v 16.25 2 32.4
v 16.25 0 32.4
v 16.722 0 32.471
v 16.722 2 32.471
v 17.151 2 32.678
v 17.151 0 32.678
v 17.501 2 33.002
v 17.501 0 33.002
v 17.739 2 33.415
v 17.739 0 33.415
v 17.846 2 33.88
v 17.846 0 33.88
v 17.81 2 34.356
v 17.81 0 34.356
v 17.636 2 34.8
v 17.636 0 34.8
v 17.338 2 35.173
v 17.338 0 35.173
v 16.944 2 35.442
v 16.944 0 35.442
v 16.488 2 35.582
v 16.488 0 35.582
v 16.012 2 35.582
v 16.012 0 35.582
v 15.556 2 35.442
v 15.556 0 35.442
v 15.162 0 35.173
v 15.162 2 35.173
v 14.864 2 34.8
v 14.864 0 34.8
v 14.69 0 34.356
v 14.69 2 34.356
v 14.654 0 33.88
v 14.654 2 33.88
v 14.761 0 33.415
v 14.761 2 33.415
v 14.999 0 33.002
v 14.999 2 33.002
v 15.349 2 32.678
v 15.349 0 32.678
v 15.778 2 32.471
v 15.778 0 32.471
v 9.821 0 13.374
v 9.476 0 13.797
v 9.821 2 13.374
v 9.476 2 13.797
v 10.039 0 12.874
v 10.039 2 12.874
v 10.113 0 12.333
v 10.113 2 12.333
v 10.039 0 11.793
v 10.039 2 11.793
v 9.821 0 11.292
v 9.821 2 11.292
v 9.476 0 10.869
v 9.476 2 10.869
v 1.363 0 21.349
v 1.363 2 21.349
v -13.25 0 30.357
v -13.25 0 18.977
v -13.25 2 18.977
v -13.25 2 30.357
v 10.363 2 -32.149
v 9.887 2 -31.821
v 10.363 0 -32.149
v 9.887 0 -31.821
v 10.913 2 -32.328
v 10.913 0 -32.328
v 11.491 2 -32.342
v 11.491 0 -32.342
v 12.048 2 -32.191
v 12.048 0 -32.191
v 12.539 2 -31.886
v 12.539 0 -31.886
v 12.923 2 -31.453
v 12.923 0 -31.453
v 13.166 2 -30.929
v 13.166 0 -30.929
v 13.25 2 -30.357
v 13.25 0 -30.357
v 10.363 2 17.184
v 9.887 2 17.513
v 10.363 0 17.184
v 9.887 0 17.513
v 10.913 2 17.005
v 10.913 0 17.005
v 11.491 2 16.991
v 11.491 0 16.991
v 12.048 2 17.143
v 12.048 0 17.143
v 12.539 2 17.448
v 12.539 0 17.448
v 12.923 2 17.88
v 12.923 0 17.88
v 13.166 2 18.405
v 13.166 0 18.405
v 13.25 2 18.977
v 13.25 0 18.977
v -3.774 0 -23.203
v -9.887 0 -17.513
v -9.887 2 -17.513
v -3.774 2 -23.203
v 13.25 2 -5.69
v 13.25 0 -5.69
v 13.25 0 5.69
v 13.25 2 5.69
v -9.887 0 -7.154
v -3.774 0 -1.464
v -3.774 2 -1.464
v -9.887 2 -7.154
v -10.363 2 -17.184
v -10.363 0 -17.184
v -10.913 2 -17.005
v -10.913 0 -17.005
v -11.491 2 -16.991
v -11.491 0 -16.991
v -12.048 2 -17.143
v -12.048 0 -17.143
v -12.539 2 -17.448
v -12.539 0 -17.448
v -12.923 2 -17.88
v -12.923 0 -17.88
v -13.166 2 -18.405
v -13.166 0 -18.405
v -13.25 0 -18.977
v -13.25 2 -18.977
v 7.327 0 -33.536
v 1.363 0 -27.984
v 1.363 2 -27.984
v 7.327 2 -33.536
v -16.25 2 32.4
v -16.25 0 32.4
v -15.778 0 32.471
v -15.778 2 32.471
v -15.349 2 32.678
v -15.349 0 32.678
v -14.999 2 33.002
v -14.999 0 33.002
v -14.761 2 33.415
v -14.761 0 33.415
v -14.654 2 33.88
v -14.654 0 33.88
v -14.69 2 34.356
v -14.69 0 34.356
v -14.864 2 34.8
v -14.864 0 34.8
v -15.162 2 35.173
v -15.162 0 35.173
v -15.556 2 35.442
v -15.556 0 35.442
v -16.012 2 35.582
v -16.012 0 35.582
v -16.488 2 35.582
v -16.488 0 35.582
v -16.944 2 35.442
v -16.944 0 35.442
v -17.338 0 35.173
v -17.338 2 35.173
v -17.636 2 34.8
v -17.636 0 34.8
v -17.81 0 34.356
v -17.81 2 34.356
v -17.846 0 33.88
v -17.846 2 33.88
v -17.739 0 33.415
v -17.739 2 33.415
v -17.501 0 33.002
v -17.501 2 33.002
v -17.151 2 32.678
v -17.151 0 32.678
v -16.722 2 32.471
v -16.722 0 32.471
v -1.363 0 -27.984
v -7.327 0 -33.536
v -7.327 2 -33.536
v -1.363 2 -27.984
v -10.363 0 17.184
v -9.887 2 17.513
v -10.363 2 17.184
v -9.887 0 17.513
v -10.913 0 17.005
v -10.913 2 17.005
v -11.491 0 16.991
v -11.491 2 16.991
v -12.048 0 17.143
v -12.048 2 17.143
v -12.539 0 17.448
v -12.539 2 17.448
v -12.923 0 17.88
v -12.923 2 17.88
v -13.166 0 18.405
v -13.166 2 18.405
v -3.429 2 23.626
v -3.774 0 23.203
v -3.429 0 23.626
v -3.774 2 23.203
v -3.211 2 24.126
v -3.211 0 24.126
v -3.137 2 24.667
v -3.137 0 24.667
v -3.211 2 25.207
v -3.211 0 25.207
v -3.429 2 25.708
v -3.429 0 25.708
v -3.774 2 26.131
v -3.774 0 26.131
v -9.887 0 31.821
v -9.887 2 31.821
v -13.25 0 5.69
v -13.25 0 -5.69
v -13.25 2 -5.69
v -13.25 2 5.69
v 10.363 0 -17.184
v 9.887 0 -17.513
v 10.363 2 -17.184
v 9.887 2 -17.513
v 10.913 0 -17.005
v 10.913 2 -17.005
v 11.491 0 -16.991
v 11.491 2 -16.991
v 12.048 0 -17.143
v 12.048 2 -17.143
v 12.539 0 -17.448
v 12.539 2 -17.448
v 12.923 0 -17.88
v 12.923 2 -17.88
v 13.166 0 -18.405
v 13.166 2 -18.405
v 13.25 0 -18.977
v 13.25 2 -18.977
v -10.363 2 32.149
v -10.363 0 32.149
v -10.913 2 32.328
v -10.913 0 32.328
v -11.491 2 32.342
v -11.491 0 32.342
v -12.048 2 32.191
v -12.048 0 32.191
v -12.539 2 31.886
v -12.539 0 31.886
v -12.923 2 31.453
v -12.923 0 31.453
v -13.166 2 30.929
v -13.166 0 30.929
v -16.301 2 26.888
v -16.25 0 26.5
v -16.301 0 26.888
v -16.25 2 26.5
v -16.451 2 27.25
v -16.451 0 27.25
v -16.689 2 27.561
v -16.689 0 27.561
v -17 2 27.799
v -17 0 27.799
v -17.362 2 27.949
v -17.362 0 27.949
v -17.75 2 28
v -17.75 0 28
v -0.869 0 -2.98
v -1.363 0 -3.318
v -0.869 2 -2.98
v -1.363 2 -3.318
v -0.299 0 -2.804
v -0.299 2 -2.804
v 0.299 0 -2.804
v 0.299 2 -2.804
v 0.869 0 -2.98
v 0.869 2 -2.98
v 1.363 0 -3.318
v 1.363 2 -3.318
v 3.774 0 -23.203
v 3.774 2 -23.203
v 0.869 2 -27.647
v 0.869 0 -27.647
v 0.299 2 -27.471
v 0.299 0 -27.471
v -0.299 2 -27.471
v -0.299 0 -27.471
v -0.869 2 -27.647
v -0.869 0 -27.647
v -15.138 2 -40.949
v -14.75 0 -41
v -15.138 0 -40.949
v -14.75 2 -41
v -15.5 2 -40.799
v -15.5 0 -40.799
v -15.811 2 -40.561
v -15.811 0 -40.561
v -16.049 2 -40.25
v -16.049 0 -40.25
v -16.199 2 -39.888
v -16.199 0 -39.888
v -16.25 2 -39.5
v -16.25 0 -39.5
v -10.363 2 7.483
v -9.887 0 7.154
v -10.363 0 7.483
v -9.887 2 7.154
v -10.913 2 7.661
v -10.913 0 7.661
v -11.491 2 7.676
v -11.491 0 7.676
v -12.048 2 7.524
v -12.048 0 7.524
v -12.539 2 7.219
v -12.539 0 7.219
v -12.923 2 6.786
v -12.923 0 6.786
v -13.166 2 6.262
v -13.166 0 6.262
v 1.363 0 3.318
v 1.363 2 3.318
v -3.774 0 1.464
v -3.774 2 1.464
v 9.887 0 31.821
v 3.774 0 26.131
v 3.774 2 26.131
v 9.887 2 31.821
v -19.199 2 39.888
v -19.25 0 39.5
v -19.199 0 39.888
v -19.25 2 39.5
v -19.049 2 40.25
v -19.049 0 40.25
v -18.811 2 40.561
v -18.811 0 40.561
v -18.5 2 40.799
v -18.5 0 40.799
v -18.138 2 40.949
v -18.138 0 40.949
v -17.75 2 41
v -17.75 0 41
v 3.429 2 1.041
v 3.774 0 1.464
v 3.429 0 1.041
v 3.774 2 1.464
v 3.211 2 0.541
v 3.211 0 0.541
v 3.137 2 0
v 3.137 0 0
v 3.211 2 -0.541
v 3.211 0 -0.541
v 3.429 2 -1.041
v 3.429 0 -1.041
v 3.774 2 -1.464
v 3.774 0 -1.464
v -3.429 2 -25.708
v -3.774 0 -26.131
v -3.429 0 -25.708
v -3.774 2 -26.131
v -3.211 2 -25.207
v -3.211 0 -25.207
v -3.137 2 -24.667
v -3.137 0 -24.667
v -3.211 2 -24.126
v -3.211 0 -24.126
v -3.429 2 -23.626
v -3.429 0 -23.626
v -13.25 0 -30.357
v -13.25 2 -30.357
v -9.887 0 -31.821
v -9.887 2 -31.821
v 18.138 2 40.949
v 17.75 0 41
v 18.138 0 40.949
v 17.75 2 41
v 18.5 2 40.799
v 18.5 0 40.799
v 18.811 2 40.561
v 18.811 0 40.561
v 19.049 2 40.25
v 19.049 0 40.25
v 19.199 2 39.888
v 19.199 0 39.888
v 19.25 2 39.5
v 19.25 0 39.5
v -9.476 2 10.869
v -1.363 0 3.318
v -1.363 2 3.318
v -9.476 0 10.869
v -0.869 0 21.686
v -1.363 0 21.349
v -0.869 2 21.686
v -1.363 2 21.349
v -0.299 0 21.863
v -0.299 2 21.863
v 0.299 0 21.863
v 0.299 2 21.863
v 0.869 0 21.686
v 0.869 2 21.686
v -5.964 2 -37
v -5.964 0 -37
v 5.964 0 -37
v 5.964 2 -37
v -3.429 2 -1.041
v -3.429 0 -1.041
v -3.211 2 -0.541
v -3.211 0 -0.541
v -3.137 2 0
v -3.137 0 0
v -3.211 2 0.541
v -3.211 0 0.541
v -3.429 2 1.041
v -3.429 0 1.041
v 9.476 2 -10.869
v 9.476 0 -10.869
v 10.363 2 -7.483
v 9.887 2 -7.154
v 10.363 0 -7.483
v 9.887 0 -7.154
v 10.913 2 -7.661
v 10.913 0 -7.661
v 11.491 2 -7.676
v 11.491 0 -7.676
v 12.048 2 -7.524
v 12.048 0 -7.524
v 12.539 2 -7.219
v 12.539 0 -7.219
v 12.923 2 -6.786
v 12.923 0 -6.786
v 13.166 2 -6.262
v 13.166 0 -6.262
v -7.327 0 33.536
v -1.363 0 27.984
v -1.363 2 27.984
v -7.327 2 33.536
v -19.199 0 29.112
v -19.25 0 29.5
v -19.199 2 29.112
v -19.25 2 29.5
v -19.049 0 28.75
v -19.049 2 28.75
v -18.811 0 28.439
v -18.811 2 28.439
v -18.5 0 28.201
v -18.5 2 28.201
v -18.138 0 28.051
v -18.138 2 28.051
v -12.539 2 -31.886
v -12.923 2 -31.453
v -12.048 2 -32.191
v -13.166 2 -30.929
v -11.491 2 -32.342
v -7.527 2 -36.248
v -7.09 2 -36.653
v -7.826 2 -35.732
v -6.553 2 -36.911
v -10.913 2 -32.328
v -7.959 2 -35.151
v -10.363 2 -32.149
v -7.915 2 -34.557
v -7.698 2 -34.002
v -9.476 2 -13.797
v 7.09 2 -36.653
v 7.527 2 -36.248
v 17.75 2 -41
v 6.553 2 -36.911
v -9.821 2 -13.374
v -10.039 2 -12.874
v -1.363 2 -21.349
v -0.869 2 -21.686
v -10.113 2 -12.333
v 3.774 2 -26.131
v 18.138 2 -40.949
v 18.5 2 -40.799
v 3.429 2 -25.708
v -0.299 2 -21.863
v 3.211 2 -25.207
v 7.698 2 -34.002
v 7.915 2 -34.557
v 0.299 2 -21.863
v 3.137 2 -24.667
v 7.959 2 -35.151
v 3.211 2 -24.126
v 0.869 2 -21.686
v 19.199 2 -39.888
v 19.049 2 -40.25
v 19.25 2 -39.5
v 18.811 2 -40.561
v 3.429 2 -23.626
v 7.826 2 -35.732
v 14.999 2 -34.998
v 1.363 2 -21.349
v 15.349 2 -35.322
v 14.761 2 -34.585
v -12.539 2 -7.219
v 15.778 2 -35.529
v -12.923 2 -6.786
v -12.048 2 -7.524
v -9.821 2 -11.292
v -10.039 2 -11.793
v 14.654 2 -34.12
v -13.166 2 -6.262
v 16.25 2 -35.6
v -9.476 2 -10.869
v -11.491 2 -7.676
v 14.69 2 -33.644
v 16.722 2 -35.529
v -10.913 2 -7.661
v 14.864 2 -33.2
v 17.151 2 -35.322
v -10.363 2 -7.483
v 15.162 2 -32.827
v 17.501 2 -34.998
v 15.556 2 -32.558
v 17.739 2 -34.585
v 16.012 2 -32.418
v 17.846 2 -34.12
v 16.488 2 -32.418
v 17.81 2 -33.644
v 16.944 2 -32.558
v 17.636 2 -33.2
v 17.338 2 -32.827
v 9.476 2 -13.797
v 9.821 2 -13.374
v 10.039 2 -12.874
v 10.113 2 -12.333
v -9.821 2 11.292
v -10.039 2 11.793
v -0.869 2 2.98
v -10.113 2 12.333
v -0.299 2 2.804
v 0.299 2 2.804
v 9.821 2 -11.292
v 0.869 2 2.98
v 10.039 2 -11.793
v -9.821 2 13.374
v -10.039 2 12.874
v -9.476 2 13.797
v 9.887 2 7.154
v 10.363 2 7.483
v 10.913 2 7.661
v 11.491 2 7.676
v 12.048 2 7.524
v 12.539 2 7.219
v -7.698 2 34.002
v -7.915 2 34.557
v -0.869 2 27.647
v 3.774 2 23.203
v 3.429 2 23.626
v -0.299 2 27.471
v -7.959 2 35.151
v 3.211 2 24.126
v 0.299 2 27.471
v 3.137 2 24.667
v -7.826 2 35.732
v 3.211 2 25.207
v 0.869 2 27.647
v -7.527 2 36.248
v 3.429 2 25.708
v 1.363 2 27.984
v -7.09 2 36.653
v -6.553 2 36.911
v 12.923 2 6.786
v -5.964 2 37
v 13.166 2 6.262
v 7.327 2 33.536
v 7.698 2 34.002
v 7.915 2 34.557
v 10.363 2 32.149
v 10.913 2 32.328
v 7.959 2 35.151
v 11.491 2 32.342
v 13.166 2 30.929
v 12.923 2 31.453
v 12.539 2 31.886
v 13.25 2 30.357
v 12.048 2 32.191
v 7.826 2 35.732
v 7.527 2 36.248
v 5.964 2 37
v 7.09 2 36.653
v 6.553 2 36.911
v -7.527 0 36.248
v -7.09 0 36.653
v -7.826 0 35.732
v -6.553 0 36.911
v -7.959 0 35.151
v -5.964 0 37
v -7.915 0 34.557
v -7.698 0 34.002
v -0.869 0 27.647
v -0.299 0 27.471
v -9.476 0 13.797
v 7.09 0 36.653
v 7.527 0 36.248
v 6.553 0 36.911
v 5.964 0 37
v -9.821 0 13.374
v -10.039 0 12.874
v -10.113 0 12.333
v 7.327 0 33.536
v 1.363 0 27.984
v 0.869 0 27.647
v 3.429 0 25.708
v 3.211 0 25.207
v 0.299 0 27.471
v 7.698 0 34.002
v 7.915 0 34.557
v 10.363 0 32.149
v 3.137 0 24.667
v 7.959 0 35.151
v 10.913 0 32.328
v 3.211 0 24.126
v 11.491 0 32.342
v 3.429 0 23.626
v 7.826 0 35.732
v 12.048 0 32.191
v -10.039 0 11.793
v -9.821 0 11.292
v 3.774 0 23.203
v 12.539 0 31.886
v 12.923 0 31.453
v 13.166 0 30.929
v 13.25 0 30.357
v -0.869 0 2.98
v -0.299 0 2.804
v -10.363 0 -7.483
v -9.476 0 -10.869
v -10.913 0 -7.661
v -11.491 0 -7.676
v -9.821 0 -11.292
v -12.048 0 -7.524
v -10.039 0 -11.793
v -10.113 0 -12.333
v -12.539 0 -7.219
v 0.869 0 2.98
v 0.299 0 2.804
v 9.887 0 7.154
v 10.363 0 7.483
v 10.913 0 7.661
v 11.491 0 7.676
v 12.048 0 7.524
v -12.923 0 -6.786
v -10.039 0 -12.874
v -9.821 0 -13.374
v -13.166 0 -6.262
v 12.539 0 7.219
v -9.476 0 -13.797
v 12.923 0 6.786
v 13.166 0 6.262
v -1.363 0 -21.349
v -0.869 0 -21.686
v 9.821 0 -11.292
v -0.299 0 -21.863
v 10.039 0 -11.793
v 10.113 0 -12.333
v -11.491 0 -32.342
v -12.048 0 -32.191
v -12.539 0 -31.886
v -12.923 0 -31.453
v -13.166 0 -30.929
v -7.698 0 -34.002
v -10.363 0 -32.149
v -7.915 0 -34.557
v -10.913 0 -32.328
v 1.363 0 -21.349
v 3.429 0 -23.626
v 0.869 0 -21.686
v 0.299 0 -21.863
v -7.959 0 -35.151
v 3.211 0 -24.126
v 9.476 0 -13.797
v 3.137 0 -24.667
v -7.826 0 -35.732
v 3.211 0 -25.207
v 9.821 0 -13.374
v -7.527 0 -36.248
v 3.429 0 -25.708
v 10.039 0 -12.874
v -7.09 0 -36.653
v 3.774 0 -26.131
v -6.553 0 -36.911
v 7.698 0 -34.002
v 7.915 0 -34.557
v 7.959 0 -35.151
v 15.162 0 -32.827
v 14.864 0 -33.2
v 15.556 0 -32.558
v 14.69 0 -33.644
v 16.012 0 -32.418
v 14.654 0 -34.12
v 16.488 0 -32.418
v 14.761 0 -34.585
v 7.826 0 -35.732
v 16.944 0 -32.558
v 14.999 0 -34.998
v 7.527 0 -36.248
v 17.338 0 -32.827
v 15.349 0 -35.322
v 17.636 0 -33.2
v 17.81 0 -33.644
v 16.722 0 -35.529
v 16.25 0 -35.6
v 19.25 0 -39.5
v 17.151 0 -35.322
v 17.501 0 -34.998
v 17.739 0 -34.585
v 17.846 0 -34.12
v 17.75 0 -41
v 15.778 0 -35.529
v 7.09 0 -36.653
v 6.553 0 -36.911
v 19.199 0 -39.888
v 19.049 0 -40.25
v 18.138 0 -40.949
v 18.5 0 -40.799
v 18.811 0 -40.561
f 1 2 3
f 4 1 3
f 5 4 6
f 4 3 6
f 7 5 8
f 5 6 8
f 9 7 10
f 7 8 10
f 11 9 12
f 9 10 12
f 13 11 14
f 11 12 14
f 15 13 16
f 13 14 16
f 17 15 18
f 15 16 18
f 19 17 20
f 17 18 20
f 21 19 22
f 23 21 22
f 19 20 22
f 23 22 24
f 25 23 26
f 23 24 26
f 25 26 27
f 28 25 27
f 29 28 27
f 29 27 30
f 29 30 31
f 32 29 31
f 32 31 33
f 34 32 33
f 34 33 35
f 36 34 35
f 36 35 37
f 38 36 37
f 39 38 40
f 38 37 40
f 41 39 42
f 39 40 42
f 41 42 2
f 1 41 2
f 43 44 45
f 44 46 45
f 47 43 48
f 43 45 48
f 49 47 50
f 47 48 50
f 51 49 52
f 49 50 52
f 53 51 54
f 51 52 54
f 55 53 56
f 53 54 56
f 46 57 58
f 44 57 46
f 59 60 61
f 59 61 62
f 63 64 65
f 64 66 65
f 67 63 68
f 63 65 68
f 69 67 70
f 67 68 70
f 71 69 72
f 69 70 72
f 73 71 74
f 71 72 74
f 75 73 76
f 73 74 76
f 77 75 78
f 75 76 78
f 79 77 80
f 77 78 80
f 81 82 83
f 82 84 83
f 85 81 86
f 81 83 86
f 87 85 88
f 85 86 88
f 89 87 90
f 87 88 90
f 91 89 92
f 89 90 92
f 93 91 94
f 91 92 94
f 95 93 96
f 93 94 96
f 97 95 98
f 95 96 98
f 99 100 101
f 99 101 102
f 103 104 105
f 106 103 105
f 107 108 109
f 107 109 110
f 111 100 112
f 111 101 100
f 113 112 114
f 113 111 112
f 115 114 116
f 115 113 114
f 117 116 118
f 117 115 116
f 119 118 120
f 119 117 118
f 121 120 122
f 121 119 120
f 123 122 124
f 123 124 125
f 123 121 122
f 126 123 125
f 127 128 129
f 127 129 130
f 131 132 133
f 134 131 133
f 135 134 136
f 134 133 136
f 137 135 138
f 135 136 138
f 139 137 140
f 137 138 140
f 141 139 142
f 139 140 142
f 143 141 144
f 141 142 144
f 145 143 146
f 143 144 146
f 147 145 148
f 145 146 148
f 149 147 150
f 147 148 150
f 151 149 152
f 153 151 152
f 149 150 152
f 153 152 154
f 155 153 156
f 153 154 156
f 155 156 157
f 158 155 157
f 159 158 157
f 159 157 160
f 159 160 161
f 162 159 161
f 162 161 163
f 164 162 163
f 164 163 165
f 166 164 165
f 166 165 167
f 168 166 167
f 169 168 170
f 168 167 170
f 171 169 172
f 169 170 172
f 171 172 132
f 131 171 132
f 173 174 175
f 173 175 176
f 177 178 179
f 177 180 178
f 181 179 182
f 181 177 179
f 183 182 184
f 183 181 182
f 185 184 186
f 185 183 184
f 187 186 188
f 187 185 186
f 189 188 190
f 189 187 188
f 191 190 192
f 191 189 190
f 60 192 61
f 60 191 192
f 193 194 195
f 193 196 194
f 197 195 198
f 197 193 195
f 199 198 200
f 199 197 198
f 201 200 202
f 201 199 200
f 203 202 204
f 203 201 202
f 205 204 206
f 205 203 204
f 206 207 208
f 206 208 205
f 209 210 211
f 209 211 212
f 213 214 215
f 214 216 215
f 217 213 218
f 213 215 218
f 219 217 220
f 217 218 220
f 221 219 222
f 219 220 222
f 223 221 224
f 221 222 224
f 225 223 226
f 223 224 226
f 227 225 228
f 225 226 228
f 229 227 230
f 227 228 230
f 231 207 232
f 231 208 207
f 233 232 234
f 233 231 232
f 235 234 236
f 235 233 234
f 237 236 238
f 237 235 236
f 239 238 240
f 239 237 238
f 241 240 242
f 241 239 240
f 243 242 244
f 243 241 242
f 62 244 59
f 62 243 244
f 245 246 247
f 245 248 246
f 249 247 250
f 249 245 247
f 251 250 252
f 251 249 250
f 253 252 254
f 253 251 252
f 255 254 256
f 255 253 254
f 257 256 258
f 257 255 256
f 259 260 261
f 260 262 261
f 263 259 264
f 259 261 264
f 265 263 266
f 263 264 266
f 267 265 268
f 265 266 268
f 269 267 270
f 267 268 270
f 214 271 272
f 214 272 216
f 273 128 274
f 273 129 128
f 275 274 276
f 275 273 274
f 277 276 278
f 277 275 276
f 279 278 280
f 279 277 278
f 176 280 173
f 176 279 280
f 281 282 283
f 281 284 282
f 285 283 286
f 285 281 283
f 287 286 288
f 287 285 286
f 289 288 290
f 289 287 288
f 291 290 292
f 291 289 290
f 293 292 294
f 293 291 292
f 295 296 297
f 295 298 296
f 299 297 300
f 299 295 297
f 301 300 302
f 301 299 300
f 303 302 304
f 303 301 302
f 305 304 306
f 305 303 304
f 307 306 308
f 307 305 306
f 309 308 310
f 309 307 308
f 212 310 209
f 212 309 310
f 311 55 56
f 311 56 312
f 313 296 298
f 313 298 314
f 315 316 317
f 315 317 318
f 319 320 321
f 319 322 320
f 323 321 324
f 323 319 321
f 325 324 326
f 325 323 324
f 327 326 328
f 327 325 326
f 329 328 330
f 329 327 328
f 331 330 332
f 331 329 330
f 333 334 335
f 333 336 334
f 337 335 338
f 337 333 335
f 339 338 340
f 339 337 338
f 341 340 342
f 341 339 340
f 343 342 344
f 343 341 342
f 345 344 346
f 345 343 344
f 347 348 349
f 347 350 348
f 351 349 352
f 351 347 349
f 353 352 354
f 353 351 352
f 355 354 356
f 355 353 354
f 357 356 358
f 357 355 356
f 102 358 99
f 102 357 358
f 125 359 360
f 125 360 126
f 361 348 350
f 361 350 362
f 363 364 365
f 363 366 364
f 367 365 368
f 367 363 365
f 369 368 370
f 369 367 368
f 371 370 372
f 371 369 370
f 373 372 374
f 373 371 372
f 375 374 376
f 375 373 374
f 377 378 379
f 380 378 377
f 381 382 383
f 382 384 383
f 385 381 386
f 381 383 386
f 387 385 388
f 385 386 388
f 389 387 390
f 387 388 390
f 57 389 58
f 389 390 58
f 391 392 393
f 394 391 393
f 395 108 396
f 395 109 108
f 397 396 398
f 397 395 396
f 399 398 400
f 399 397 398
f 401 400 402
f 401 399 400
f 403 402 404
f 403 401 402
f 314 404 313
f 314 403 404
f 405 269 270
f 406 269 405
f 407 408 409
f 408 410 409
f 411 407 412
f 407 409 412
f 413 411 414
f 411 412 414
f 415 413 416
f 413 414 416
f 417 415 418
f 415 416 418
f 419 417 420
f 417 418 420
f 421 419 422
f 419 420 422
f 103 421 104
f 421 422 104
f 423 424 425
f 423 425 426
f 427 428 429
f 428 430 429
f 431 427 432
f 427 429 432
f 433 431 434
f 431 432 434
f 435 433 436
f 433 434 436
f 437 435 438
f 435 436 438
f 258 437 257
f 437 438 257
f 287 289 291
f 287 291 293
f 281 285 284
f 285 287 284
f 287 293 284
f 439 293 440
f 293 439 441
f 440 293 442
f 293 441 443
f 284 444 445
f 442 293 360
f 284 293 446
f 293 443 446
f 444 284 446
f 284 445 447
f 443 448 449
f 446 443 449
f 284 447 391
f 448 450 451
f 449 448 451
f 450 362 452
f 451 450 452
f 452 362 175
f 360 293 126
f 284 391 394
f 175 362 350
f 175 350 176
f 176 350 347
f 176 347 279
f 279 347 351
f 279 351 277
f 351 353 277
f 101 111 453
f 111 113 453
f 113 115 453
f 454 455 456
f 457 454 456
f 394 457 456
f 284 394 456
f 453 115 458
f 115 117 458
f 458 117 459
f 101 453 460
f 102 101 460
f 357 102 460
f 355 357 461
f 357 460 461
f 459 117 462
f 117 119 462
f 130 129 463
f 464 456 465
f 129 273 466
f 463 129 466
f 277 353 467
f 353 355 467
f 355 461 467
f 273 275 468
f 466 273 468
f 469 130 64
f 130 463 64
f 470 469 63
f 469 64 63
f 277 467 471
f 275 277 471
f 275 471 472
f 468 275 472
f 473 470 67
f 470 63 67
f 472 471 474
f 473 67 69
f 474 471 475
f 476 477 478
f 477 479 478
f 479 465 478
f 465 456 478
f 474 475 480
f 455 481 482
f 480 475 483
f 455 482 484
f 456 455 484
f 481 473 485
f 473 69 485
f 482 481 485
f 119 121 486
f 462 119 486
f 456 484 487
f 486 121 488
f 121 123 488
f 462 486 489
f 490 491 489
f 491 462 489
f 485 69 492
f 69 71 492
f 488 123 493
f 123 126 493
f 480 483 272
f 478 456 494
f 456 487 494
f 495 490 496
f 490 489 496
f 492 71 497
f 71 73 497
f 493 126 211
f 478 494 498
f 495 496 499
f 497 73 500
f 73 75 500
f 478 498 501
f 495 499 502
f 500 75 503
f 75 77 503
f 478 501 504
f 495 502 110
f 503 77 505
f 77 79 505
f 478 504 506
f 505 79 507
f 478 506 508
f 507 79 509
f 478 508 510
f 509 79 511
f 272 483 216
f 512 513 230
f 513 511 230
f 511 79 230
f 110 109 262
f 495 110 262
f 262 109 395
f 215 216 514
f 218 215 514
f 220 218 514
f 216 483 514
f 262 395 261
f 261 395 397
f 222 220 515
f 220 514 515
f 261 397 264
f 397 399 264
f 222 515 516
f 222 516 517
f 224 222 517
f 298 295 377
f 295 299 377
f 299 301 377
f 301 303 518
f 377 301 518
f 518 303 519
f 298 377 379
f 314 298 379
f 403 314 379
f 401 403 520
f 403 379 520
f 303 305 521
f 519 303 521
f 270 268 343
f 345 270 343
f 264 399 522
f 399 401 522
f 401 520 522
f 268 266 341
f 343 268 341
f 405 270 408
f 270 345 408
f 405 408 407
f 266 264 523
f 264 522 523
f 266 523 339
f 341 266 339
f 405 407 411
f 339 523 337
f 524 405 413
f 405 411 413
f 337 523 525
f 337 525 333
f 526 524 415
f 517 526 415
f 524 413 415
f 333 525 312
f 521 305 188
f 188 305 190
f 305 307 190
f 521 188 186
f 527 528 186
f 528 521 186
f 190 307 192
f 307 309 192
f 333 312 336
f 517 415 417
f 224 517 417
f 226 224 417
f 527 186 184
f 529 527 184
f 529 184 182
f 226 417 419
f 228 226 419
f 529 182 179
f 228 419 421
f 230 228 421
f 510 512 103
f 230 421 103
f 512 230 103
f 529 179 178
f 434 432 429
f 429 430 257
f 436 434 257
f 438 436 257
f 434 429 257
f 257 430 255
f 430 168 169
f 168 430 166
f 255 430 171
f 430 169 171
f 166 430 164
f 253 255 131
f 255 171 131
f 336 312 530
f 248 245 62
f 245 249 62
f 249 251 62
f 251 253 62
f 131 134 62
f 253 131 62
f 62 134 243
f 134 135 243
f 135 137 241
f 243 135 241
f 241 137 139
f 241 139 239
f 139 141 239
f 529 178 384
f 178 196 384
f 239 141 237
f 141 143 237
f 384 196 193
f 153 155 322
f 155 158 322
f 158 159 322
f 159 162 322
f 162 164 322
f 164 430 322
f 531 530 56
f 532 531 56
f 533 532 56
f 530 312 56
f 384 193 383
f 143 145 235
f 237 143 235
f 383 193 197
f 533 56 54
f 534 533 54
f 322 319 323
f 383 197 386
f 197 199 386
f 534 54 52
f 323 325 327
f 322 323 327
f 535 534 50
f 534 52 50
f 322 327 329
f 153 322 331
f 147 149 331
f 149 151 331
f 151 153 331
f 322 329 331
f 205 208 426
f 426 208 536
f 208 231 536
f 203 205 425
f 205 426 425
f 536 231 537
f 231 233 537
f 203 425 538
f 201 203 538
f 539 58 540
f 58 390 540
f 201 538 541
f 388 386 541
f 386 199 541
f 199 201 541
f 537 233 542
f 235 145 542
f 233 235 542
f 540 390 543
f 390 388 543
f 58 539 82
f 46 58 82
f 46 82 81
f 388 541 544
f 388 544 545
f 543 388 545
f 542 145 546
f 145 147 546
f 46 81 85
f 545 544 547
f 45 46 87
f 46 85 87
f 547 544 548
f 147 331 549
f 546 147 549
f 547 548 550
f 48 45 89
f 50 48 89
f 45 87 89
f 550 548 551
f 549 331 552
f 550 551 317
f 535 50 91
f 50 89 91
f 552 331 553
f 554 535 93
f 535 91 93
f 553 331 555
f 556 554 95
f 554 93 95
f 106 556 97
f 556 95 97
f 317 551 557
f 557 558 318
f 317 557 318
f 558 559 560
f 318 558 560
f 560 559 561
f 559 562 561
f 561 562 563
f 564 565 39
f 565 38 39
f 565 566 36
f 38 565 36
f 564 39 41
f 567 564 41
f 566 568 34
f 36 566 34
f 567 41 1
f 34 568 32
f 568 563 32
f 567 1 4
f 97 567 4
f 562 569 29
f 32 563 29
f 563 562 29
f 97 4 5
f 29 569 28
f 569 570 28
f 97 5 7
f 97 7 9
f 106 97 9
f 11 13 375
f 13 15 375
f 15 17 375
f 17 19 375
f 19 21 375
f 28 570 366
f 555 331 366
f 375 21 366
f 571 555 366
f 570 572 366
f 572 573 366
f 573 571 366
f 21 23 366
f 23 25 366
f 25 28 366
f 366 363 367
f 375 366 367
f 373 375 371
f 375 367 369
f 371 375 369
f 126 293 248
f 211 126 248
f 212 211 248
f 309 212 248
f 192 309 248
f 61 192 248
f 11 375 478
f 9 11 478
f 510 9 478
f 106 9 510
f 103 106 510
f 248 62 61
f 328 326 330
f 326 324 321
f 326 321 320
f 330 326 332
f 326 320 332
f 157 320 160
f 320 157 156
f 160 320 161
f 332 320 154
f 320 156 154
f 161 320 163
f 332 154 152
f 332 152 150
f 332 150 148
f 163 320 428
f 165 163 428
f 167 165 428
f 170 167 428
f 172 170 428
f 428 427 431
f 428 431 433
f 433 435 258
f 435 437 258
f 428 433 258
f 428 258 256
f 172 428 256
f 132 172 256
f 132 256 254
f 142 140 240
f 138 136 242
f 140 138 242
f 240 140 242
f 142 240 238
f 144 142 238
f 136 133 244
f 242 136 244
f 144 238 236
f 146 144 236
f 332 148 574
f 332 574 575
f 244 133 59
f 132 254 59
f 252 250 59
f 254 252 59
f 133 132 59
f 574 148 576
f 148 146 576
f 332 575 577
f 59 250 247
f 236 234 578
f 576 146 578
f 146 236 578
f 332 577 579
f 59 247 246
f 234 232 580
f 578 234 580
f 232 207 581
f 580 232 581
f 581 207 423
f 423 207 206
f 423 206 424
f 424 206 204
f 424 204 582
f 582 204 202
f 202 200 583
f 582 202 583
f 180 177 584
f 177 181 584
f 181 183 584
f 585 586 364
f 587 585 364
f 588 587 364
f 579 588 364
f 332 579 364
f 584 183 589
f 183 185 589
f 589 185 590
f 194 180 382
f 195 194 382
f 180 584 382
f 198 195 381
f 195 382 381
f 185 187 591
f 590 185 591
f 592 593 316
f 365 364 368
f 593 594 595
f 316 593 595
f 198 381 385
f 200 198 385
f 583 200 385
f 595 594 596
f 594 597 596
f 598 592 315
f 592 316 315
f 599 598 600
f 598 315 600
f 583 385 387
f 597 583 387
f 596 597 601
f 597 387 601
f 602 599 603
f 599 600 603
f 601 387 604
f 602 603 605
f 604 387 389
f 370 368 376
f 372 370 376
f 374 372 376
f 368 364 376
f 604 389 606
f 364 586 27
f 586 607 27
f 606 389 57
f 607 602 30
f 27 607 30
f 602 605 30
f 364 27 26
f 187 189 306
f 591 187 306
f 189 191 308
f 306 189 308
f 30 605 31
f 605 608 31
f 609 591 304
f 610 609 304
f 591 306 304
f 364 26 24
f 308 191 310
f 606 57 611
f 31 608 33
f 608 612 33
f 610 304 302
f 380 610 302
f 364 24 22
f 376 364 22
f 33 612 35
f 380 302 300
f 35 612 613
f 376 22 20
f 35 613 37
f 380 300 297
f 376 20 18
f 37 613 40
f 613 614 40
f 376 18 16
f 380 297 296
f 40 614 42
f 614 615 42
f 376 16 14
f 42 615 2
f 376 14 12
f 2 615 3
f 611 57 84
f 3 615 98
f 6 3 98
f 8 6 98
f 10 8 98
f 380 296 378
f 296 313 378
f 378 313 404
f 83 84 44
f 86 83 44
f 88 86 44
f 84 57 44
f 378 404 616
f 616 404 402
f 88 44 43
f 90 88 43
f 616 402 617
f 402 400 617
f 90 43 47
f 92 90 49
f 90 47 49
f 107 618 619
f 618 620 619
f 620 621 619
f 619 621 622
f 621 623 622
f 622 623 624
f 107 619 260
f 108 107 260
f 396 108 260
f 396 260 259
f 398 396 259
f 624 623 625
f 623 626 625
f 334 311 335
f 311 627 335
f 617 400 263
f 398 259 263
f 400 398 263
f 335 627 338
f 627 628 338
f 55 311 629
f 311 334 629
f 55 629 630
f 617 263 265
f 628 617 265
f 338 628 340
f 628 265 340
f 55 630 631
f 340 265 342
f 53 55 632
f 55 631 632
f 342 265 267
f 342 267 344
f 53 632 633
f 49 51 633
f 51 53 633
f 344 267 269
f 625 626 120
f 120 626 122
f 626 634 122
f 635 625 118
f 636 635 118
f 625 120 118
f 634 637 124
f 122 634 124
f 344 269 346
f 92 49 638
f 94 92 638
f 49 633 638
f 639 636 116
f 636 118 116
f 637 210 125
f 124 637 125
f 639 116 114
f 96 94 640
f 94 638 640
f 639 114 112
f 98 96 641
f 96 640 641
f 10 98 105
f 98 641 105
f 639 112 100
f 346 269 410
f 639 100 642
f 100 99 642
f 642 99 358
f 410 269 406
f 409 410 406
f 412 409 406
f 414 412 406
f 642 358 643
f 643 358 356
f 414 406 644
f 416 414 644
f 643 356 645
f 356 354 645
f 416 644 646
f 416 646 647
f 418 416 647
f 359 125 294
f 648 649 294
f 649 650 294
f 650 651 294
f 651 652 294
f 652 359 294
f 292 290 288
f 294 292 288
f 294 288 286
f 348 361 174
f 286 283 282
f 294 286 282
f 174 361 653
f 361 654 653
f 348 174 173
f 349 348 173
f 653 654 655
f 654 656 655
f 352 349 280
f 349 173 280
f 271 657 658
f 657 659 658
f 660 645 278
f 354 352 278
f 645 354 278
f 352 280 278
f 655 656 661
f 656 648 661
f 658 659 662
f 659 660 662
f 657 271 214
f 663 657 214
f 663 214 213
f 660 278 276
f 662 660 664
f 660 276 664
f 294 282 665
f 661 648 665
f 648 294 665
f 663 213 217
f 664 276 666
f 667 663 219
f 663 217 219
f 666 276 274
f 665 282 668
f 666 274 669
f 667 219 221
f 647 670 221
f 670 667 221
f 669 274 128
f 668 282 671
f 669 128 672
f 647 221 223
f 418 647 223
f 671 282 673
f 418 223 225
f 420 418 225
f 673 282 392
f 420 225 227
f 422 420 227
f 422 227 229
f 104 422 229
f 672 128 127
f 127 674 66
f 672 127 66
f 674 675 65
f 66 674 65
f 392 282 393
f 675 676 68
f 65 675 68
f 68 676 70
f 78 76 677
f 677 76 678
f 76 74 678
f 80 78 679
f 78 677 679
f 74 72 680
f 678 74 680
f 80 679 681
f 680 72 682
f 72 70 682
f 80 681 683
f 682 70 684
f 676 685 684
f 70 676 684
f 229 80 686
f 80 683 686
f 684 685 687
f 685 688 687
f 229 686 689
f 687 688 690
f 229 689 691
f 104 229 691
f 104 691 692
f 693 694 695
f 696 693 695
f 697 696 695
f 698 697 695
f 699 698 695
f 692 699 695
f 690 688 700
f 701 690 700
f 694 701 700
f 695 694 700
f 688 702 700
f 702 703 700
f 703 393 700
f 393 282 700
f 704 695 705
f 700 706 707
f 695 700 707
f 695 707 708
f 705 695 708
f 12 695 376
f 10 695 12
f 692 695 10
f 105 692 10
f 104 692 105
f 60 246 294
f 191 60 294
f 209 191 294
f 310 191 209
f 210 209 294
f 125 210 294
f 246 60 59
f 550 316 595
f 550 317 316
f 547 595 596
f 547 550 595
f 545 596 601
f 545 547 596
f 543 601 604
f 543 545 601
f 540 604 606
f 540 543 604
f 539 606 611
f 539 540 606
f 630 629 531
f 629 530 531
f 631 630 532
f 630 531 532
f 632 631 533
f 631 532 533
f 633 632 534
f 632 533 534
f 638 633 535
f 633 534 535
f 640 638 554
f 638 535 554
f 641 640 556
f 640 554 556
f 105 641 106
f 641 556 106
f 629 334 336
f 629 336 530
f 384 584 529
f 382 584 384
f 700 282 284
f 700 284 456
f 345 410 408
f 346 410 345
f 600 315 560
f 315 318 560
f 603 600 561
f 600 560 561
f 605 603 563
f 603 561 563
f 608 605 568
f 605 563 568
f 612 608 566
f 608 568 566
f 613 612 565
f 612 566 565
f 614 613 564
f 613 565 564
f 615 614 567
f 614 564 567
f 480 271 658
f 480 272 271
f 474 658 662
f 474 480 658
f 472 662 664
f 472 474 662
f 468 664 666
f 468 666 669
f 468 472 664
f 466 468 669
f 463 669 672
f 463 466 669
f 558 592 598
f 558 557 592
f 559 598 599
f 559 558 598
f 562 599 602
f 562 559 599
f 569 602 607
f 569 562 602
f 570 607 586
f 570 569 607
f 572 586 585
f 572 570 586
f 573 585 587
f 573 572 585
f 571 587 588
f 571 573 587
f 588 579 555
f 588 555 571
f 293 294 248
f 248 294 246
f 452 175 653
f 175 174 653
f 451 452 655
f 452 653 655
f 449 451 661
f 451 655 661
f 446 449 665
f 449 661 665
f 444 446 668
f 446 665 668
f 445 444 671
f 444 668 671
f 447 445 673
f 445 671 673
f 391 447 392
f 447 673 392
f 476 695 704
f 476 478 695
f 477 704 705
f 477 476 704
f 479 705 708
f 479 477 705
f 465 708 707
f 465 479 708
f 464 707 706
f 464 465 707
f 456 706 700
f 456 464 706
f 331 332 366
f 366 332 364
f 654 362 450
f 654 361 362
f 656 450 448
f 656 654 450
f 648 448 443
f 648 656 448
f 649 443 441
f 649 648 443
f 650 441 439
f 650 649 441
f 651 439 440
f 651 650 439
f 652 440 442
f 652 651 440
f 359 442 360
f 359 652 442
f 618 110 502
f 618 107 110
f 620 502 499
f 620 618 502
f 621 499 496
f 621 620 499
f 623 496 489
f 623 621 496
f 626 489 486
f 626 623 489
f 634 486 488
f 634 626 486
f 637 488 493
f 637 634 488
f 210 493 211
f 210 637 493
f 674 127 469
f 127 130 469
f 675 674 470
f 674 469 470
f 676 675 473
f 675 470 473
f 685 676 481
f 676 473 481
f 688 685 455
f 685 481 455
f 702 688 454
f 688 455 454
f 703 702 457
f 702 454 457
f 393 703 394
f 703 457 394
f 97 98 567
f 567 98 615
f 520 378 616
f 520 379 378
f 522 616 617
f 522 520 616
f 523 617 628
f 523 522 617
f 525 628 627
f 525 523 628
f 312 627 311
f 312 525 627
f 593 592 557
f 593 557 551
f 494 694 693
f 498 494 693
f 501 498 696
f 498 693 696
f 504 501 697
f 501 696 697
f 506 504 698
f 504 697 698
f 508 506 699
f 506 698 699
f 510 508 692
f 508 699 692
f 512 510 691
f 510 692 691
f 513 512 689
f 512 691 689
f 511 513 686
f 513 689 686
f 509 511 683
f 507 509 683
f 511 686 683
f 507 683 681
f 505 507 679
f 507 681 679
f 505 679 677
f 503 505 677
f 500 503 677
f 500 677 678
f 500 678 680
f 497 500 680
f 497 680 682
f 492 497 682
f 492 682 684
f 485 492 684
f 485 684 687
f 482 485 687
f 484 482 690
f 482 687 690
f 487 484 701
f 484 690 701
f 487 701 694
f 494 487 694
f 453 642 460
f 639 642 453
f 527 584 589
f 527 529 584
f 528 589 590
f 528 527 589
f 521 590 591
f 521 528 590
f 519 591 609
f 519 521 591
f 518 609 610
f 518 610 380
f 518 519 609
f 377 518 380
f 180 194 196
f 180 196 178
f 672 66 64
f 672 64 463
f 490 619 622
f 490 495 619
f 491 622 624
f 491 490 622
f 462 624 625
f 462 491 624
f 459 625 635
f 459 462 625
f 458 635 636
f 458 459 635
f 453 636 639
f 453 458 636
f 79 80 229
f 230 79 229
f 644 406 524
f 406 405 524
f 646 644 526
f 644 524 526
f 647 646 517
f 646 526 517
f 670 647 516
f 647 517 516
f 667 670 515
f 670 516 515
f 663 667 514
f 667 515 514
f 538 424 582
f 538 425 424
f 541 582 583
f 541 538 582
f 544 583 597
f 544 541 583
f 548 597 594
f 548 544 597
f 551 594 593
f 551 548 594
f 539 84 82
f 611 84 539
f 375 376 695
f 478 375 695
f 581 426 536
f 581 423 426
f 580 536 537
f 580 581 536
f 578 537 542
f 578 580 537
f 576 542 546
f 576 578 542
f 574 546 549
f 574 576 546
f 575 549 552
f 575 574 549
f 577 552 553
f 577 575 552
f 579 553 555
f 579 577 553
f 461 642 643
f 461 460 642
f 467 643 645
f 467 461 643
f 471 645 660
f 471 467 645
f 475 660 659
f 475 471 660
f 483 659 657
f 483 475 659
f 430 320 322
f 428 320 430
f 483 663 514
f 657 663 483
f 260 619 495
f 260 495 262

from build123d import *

# Parameters (mm, degrees)
SKETCH_1_W          = 38.5
SKETCH_1_H          = 82
EXTRUDE_1_DEPTH     = 2
SKETCH_2_R          = 1.6
CUT_EXTRUDE_1_DEPTH = 2
SKETCH_3_W          = 3
SKETCH_3_H          = 69
SKETCH_3_W_2        = 26.5
SKETCH_3_H_2        = 74
CUT_EXTRUDE_2_DEPTH = 10
EXTRUDE_1_2_DEPTH   = 2
FILLET_1_R          = 2
FILLET_2_R          = 1.5


with BuildPart() as part:
    # 草图1 → Extrude 1 (new body)
    with BuildSketch(Plane(origin=(0, 0, 0), x_dir=(1, 0, 0), z_dir=(0, 1, 0))):
        Rectangle(SKETCH_1_W, SKETCH_1_H)
    extrude(amount=EXTRUDE_1_DEPTH)

    # 草图2 → 切除-拉伸1 (cut)
    with BuildSketch(Plane.XZ):
        with Locations(Location((16.25, -34, 0), (0, 0, 270))):
            Circle(SKETCH_2_R)
        with Locations(Location((16.25, 34, 0), (0, 0, 270))):
            Circle(SKETCH_2_R)
        with Locations(Location((-16.25, 34, 0), (0, 0, 270))):
            Circle(SKETCH_2_R)
    extrude(amount=-CUT_EXTRUDE_1_DEPTH, mode=Mode.SUBTRACT)

    # 草图3 → 切除-拉伸2 (cut)
    with BuildSketch(Plane.XZ):
        with Locations((-17.75, -6.5)):
            Rectangle(SKETCH_3_W, SKETCH_3_H)
        Rectangle(SKETCH_3_W_2, SKETCH_3_H_2)
    extrude(amount=-CUT_EXTRUDE_2_DEPTH, mode=Mode.SUBTRACT)

    # 草图4 → Extrude 1 2 (add)
    with BuildSketch(Plane.XZ):
        Polygon((-14.272000233, 35.90204029), (11.048434944, 12.333333333), (-15.451565056, -12.333333333), (12.227999767, -38.09795971), (14.272000233, -35.90204029), (-11.048434944, -12.333333333), (15.451565056, 12.333333333), (-12.227999767, 38.09795971), align=None)
        Polygon((12.227999767, 38.09795971), (-15.451565056, 12.333333333), (11.048434944, -12.333333333), (-14.272000233, -35.90204029), (-12.227999767, -38.09795971), (15.451565056, -12.333333333), (-11.048434944, 12.333333333), (14.272000233, 35.90204029), align=None)
    extrude(amount=-EXTRUDE_1_2_DEPTH)

    # 圆角1
    fillet_1_edges = [part.edges().sort_by_distance(p)[0] for p in [
        (-2.201565056, 1, 24.666666667),
        (-2.201565056, 1, 0),
        (-2.201565056, 1, -24.666666667),
        (0, 1, 26.715922191),
        (2.201565056, 1, -24.666666667),
        (2.201565056, 1, 0),
        (2.201565056, 1, 24.666666667),
        (0, 1, -26.715922191),
        (0, 1, 2.049255524),
        (0, 1, 22.617411143),
        (11.048434944, 1, 12.333333333),
        (0, 1, -2.049255524),
        (0, 1, -22.617411143),
        (-11.048434944, 1, -12.333333333),
        (11.048434944, 1, -12.333333333),
        (-11.048434944, 1, 12.333333333),
        (-11.048434944, 1, -37),
        (11.048434944, 1, -37),
        (13.25, 1, 34.950744476),
        (13.25, 1, -10.284077809),
        (13.25, 1, -14.382588857),
        (13.25, 1, -34.950744476),
        (13.25, 1, 10.284077809),
        (13.25, 1, 14.382588857),
        (11.048434944, 1, 37),
        (-11.048434944, 1, 37),
        (-13.25, 1, -34.950744476),
        (-13.25, 1, 10.284077809),
        (-13.25, 1, 14.382588857),
        (-13.25, 1, 34.950744476),
        (-13.25, 1, -10.284077809),
        (-13.25, 1, -14.382588857),
    ]]
    fillet(fillet_1_edges, radius=FILLET_1_R)

    # 圆角2
    fillet_2_edges = [part.edges().sort_by_distance(p)[0] for p in [
        (-16.25, 1, 28),
        (19.25, 1, -41),
        (19.25, 1, 41),
        (-19.25, 1, 41),
        (-19.25, 1, 28),
        (-16.25, 1, -41),
    ]]
    fillet(fillet_2_edges, radius=FILLET_2_R - 0.0001)  # a hair under: the kernel refuses the full size


solid = part.part
